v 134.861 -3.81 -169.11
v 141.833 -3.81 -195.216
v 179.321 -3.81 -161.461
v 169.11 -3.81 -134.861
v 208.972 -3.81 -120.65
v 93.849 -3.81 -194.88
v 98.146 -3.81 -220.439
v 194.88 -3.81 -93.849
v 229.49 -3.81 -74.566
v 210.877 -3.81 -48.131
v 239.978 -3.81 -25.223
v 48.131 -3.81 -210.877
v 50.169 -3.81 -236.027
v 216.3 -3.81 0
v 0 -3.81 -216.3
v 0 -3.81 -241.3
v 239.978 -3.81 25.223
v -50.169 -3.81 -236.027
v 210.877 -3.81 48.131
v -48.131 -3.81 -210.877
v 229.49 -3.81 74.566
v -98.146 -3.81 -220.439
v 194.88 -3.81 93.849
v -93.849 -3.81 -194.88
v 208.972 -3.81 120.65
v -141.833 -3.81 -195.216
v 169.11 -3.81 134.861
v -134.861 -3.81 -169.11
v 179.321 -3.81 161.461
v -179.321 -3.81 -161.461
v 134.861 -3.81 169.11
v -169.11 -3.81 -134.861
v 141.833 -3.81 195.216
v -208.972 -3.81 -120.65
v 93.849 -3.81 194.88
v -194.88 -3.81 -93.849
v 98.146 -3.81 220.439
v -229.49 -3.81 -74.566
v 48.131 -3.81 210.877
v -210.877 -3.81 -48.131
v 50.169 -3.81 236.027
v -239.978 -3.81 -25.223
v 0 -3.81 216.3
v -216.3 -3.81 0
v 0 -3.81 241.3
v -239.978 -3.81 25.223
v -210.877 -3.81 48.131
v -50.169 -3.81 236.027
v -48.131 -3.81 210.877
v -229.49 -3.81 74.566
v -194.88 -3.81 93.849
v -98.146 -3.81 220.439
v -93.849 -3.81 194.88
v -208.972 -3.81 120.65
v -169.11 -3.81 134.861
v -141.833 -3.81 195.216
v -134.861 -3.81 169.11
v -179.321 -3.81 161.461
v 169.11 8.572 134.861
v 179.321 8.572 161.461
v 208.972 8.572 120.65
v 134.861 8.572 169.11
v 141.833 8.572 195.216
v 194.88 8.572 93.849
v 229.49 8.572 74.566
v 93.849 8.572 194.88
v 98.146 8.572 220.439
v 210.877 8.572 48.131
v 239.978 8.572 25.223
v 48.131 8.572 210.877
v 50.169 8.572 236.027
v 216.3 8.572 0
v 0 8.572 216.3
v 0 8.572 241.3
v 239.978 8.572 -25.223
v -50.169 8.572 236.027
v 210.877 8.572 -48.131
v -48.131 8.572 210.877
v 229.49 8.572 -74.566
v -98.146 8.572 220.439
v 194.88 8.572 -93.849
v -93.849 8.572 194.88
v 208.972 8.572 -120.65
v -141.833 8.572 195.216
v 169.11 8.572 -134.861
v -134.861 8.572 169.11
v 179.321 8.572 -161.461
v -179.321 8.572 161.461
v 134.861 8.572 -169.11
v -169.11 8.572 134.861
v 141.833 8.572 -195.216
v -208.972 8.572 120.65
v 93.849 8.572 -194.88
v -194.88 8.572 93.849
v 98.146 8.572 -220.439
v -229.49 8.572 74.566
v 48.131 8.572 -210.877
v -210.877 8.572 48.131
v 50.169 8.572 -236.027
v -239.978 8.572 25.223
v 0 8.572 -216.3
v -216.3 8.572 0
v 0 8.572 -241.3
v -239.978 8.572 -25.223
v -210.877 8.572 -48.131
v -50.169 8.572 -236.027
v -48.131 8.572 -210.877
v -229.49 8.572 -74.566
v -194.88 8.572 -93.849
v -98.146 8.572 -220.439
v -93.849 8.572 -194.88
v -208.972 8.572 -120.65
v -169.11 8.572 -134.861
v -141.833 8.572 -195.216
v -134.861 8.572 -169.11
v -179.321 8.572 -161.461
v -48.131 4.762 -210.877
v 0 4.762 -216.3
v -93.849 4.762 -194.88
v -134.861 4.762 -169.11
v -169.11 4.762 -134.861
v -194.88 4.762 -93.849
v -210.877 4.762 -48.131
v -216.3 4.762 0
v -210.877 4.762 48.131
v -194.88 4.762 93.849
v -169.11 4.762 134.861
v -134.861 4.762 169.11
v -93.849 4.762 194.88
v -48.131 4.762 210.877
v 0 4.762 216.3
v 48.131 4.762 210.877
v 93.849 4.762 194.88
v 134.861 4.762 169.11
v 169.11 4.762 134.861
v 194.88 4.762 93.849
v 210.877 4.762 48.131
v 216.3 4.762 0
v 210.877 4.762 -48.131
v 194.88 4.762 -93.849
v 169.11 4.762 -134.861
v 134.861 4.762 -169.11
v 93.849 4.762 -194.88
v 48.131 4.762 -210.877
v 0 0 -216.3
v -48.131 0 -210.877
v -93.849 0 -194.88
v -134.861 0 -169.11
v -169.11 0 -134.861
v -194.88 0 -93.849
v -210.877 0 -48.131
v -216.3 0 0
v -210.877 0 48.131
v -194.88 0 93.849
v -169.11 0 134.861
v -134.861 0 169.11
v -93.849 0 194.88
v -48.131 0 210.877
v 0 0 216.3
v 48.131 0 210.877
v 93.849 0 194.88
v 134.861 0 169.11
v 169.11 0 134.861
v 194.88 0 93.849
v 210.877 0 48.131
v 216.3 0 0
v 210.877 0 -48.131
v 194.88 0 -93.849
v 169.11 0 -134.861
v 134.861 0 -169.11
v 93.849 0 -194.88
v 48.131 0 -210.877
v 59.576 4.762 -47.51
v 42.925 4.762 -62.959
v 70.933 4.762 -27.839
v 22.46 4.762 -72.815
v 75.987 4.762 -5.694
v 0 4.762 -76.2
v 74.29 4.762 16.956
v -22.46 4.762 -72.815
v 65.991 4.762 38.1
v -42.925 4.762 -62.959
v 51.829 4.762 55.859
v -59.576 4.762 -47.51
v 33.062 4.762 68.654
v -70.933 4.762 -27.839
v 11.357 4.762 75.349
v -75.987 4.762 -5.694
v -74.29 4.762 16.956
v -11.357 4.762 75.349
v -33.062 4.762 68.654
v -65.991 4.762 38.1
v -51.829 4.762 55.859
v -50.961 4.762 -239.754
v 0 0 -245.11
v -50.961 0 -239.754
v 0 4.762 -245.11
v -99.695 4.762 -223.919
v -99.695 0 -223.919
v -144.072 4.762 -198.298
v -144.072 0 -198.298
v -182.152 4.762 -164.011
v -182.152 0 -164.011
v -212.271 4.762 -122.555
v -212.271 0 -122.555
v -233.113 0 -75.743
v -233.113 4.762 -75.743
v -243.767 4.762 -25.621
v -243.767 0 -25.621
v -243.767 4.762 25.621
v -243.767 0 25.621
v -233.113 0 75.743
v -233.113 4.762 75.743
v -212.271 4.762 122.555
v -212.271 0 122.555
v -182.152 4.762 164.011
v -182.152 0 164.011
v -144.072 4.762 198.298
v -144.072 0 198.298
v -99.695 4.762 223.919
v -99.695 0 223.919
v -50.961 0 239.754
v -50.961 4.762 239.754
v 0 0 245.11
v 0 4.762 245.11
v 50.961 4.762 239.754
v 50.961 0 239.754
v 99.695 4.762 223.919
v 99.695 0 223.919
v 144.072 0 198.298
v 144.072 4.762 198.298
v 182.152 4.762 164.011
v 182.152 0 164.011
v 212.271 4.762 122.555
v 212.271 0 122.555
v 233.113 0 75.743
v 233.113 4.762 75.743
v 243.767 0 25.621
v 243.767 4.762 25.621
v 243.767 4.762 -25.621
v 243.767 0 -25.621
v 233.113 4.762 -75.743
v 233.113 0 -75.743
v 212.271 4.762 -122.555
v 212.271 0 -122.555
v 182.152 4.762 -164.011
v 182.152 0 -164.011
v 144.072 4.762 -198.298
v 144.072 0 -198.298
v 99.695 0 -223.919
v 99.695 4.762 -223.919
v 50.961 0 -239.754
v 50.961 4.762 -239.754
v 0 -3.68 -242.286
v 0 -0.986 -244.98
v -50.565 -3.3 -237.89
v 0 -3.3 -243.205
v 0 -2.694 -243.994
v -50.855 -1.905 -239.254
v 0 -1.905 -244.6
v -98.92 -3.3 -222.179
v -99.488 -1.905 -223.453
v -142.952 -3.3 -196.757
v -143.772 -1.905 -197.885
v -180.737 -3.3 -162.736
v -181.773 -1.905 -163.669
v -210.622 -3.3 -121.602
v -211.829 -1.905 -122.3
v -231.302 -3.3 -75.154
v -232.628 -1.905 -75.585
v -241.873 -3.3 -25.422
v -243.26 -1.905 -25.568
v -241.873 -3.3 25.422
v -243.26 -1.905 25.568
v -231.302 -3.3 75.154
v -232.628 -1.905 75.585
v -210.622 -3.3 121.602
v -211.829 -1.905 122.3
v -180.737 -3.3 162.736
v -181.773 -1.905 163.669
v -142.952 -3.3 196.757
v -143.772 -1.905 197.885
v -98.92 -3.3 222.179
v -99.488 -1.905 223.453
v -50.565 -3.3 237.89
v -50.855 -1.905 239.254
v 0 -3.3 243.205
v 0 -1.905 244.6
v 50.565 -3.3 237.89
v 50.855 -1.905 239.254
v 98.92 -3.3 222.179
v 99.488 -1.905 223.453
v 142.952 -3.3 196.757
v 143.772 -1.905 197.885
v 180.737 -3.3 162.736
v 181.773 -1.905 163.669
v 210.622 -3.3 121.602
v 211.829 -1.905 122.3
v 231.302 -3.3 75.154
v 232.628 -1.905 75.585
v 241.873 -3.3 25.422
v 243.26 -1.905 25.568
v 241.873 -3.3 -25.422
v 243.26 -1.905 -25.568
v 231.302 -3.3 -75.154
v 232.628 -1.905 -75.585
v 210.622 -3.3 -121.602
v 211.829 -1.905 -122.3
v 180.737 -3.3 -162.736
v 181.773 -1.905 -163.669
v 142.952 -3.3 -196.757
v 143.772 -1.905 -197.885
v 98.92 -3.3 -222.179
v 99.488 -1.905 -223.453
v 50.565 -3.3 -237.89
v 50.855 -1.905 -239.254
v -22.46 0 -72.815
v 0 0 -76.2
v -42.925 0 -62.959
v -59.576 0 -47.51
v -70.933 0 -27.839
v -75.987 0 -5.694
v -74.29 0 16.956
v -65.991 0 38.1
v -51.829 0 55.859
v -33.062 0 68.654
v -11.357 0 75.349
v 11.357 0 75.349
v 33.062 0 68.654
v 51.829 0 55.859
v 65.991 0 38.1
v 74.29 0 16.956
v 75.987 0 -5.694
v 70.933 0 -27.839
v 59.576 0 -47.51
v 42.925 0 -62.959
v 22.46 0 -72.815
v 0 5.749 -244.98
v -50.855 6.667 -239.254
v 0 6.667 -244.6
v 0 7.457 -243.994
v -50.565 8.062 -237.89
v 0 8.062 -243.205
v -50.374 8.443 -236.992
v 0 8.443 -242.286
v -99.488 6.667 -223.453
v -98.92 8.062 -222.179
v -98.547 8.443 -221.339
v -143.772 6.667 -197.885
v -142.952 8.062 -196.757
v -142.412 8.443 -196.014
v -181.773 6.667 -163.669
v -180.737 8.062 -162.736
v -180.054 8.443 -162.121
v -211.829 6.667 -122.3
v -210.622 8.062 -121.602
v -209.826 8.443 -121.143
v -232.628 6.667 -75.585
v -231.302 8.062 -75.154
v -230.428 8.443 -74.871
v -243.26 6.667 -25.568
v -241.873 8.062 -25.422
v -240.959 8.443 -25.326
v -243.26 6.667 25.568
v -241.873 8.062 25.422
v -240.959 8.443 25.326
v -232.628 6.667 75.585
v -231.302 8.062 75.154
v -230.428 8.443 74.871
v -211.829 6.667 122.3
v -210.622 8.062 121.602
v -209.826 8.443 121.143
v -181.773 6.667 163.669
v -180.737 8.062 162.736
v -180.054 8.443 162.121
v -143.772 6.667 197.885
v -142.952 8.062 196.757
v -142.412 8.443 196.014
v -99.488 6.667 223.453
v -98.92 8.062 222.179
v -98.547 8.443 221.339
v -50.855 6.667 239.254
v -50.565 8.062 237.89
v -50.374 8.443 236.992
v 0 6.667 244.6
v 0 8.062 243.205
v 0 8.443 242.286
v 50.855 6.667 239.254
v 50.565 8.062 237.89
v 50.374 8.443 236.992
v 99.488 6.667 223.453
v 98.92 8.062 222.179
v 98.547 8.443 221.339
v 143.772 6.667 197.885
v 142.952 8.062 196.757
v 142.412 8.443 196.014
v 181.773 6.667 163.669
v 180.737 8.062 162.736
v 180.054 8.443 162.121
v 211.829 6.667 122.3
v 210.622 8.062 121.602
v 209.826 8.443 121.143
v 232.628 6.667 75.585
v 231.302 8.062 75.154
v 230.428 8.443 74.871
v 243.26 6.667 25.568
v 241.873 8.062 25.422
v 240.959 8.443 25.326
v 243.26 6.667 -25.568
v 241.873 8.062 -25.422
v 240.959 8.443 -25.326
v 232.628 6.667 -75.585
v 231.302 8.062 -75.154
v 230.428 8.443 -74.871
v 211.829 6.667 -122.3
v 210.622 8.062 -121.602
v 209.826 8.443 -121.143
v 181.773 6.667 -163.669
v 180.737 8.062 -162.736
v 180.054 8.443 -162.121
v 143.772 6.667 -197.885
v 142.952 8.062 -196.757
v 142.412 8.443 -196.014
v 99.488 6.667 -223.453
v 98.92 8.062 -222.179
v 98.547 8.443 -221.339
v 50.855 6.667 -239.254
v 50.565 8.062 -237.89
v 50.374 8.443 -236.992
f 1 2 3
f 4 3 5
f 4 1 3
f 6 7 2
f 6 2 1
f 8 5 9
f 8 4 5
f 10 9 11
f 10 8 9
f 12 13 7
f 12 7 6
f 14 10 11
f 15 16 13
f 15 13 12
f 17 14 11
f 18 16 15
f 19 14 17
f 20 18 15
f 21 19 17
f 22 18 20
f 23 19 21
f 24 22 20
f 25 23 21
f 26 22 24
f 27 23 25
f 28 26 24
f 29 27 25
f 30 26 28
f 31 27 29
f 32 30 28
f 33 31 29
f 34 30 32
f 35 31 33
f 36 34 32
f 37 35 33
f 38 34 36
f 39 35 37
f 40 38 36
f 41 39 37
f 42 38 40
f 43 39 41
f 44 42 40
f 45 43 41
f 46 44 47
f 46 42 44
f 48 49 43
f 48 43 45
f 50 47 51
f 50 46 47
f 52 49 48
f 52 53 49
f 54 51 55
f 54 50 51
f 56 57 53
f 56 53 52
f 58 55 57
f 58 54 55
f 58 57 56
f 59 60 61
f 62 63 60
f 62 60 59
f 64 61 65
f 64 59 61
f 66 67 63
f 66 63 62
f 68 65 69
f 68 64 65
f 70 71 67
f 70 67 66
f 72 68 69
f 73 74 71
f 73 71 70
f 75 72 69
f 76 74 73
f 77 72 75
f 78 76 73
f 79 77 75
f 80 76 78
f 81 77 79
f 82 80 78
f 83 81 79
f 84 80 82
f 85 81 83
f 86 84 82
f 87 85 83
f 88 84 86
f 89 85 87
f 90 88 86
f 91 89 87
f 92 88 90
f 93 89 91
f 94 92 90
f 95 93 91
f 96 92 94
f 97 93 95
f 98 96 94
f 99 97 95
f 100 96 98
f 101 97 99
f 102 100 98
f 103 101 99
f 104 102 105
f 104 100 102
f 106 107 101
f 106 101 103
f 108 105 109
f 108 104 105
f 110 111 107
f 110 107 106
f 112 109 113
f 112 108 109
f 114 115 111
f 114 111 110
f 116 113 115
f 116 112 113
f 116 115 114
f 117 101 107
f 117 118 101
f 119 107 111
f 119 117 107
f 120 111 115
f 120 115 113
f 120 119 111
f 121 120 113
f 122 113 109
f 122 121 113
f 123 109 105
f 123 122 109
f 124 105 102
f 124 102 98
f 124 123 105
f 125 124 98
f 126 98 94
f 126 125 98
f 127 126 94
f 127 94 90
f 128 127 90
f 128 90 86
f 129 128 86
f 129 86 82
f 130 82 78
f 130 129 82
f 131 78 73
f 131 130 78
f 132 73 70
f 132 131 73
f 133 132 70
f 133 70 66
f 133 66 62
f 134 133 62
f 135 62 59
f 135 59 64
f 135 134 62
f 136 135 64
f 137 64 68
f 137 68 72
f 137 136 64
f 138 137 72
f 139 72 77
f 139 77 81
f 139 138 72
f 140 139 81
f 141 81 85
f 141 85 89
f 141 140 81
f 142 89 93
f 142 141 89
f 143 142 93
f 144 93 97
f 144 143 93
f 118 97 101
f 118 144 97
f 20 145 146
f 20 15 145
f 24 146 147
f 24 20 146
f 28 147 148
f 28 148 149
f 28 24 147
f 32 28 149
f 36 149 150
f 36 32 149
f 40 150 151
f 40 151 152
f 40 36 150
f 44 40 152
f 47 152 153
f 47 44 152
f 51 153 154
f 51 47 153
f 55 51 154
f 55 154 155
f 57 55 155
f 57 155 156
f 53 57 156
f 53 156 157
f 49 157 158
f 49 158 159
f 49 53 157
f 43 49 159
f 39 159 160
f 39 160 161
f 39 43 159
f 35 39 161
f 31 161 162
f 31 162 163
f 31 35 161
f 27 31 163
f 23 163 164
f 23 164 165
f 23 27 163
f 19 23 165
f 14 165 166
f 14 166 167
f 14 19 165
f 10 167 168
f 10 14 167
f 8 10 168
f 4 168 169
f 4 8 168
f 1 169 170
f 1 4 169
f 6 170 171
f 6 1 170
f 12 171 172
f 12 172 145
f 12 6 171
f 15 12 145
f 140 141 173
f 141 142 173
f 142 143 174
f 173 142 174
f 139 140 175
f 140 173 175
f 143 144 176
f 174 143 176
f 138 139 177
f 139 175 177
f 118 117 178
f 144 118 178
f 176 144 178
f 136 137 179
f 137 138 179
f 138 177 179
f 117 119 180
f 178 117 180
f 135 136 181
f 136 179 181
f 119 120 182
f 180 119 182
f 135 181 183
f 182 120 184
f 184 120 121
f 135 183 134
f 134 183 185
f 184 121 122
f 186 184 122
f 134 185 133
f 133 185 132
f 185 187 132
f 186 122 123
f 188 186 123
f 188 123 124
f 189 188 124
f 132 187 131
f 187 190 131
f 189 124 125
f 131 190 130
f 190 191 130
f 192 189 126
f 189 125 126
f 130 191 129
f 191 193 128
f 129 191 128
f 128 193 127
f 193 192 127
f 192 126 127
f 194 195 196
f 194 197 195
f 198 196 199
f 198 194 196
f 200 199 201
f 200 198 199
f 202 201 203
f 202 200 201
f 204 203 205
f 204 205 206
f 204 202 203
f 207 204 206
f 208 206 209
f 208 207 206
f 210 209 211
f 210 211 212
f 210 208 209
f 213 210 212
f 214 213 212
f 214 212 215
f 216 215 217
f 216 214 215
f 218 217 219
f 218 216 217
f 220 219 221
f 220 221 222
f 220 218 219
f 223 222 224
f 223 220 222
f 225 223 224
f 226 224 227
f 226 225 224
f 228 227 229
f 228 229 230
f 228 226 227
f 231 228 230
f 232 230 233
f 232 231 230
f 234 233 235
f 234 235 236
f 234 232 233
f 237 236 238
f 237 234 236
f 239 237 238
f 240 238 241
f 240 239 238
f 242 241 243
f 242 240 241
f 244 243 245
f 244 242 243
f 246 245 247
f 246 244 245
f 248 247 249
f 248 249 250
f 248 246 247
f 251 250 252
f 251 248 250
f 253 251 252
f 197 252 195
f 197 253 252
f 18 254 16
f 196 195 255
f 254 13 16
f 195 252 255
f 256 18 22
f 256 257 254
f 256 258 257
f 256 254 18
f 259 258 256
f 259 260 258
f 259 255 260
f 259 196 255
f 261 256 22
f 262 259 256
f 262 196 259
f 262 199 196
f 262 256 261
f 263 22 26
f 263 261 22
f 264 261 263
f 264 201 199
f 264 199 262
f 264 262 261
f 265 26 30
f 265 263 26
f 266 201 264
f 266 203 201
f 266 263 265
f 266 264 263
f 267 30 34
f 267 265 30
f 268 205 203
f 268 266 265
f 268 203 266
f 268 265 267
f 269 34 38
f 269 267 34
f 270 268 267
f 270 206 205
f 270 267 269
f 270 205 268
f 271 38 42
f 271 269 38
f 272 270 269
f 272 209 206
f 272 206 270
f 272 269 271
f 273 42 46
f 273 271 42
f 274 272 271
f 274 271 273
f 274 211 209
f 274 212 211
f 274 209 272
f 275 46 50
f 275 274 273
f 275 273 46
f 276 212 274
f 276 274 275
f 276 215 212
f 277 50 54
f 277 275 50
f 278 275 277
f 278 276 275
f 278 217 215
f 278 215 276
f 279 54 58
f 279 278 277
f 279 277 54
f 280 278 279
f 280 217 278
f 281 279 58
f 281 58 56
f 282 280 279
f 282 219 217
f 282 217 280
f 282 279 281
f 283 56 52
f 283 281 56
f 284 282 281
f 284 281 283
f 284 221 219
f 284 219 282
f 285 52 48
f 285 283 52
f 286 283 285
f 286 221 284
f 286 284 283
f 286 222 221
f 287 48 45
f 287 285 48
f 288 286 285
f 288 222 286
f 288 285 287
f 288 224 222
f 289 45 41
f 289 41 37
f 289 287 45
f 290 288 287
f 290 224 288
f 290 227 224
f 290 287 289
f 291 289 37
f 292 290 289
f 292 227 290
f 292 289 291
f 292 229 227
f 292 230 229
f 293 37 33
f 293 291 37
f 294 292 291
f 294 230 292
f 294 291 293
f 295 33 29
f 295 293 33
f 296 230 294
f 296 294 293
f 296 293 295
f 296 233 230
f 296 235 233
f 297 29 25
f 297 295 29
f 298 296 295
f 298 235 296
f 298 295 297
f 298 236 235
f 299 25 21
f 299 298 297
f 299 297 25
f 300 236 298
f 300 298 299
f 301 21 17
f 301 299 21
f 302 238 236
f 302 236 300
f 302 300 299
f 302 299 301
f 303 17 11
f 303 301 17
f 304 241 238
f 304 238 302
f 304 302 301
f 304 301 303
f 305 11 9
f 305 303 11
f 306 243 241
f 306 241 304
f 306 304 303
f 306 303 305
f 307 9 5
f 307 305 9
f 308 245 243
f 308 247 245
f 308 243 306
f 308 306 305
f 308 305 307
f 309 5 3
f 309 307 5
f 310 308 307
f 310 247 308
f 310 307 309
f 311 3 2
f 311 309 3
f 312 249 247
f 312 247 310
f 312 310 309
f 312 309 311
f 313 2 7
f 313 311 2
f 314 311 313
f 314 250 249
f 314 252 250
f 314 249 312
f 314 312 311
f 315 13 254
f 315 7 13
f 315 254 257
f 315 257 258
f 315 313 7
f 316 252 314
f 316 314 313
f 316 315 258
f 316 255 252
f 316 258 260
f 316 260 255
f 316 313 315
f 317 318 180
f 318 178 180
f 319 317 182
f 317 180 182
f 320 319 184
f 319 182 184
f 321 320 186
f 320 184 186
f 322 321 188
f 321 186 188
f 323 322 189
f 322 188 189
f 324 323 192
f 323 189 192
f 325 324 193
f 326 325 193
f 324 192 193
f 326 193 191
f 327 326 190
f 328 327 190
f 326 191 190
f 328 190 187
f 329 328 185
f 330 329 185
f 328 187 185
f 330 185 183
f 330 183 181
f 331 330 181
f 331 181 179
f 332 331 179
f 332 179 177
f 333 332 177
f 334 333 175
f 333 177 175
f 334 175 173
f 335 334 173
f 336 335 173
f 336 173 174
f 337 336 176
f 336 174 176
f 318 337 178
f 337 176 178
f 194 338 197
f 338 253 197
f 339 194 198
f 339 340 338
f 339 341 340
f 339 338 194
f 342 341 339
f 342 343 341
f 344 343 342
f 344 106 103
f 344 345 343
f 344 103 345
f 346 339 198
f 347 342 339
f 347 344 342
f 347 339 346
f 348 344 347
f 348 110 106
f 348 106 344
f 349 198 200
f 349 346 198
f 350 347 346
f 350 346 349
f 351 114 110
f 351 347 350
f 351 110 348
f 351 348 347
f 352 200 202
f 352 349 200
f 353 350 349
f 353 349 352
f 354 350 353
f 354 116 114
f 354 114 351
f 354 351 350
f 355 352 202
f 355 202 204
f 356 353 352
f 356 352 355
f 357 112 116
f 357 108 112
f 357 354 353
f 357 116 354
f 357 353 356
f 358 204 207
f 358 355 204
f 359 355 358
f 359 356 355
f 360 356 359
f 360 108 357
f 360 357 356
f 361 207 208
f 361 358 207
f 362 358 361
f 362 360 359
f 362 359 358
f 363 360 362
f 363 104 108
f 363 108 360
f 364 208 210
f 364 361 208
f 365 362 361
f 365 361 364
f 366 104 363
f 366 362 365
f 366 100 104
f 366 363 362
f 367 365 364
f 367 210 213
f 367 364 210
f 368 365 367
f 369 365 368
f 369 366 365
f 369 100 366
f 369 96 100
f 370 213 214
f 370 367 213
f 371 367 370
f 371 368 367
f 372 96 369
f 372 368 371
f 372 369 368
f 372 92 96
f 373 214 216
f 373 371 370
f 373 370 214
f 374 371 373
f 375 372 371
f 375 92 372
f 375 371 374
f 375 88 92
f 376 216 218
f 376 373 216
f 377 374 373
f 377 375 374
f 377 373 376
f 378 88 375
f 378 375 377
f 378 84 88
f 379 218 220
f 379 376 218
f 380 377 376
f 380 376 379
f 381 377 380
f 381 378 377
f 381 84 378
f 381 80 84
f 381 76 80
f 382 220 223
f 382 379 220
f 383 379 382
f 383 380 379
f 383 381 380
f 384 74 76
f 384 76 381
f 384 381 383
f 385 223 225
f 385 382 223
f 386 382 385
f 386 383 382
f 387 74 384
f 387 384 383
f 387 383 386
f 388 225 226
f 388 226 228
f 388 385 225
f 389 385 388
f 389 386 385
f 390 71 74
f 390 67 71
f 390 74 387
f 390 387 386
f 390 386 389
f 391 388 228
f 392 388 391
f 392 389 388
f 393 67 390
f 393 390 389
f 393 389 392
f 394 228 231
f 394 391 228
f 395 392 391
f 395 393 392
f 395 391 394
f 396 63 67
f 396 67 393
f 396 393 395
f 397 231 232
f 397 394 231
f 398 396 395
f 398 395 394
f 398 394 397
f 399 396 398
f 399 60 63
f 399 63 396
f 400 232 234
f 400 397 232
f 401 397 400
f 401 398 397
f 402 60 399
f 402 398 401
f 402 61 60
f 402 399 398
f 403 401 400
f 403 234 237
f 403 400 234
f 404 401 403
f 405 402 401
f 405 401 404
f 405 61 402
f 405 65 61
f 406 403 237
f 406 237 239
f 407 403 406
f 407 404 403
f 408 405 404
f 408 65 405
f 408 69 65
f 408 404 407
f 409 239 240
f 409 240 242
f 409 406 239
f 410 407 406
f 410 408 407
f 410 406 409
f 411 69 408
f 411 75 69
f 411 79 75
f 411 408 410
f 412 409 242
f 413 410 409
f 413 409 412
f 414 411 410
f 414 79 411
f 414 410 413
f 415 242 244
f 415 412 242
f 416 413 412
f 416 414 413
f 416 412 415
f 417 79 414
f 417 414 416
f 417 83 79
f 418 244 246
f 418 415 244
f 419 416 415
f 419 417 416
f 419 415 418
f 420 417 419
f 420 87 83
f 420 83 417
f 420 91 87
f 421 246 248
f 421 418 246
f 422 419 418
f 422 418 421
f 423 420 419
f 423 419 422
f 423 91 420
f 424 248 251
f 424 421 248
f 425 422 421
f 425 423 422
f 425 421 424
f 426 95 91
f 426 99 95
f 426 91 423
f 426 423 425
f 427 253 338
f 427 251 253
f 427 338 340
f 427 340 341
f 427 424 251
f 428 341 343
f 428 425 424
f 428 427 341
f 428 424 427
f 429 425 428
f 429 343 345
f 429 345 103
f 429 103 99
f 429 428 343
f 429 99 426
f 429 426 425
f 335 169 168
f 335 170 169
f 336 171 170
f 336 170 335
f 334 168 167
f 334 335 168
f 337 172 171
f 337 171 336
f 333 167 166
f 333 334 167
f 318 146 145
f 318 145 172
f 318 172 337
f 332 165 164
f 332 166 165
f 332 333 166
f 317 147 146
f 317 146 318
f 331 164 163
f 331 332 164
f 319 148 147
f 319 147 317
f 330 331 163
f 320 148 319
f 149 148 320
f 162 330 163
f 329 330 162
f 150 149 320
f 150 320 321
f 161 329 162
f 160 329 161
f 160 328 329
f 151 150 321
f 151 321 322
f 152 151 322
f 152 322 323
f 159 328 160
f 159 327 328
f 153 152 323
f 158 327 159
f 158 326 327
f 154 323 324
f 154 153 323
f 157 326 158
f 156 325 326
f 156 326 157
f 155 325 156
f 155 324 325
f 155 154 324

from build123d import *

# Parameters (mm, degrees)
SKETCH1_W = 165.1
SKETCH1_H = 4.7625


with BuildPart() as part:
    # Sketch1 → Revolve1 (revolve)
    with BuildSketch(Plane.XY, mode=Mode.PRIVATE) as revolve1_sk:
        with Locations((158.75, 2.38125)):
            Rectangle(SKETCH1_W, SKETCH1_H)
    revolve(revolve1_sk.sketch.rotate(Axis((0, -187.080769231, 0), (0, 1, 0)), 90), axis=Axis((0, -187.080769231, 0), (0, 1, 0)))

    # Sketch2 → Revolve2 (revolve)
    with BuildSketch(Plane.XY, mode=Mode.PRIVATE) as revolve2_sk:
        with BuildLine():
            Line((216.3, -3.81), (241.3, -3.81))
            ThreePointArc((241.3, -3.81), (243.994076836, -2.694076836), (245.11, 0))
            Line((245.11, 0), (245.11, 4.7625))
            ThreePointArc((245.11, 4.7625), (243.994076836, 7.456576836), (241.3, 8.5725))
            Line((241.3, 8.5725), (216.3, 8.5725))
            Line((216.3, 8.5725), (216.3, 4.7625))
            Line((216.3, 4.7625), (241.3, 4.7625))
            Line((241.3, 4.7625), (241.3, 0))
            Line((241.3, 0), (216.3, 0))
            Line((216.3, 0), (216.3, -3.81))
        make_face()
    revolve(revolve2_sk.sketch.rotate(Axis((0, 0, 0), (0, 1, 0)), 90), axis=Axis((0, 0, 0), (0, 1, 0)))


solid = part.part
